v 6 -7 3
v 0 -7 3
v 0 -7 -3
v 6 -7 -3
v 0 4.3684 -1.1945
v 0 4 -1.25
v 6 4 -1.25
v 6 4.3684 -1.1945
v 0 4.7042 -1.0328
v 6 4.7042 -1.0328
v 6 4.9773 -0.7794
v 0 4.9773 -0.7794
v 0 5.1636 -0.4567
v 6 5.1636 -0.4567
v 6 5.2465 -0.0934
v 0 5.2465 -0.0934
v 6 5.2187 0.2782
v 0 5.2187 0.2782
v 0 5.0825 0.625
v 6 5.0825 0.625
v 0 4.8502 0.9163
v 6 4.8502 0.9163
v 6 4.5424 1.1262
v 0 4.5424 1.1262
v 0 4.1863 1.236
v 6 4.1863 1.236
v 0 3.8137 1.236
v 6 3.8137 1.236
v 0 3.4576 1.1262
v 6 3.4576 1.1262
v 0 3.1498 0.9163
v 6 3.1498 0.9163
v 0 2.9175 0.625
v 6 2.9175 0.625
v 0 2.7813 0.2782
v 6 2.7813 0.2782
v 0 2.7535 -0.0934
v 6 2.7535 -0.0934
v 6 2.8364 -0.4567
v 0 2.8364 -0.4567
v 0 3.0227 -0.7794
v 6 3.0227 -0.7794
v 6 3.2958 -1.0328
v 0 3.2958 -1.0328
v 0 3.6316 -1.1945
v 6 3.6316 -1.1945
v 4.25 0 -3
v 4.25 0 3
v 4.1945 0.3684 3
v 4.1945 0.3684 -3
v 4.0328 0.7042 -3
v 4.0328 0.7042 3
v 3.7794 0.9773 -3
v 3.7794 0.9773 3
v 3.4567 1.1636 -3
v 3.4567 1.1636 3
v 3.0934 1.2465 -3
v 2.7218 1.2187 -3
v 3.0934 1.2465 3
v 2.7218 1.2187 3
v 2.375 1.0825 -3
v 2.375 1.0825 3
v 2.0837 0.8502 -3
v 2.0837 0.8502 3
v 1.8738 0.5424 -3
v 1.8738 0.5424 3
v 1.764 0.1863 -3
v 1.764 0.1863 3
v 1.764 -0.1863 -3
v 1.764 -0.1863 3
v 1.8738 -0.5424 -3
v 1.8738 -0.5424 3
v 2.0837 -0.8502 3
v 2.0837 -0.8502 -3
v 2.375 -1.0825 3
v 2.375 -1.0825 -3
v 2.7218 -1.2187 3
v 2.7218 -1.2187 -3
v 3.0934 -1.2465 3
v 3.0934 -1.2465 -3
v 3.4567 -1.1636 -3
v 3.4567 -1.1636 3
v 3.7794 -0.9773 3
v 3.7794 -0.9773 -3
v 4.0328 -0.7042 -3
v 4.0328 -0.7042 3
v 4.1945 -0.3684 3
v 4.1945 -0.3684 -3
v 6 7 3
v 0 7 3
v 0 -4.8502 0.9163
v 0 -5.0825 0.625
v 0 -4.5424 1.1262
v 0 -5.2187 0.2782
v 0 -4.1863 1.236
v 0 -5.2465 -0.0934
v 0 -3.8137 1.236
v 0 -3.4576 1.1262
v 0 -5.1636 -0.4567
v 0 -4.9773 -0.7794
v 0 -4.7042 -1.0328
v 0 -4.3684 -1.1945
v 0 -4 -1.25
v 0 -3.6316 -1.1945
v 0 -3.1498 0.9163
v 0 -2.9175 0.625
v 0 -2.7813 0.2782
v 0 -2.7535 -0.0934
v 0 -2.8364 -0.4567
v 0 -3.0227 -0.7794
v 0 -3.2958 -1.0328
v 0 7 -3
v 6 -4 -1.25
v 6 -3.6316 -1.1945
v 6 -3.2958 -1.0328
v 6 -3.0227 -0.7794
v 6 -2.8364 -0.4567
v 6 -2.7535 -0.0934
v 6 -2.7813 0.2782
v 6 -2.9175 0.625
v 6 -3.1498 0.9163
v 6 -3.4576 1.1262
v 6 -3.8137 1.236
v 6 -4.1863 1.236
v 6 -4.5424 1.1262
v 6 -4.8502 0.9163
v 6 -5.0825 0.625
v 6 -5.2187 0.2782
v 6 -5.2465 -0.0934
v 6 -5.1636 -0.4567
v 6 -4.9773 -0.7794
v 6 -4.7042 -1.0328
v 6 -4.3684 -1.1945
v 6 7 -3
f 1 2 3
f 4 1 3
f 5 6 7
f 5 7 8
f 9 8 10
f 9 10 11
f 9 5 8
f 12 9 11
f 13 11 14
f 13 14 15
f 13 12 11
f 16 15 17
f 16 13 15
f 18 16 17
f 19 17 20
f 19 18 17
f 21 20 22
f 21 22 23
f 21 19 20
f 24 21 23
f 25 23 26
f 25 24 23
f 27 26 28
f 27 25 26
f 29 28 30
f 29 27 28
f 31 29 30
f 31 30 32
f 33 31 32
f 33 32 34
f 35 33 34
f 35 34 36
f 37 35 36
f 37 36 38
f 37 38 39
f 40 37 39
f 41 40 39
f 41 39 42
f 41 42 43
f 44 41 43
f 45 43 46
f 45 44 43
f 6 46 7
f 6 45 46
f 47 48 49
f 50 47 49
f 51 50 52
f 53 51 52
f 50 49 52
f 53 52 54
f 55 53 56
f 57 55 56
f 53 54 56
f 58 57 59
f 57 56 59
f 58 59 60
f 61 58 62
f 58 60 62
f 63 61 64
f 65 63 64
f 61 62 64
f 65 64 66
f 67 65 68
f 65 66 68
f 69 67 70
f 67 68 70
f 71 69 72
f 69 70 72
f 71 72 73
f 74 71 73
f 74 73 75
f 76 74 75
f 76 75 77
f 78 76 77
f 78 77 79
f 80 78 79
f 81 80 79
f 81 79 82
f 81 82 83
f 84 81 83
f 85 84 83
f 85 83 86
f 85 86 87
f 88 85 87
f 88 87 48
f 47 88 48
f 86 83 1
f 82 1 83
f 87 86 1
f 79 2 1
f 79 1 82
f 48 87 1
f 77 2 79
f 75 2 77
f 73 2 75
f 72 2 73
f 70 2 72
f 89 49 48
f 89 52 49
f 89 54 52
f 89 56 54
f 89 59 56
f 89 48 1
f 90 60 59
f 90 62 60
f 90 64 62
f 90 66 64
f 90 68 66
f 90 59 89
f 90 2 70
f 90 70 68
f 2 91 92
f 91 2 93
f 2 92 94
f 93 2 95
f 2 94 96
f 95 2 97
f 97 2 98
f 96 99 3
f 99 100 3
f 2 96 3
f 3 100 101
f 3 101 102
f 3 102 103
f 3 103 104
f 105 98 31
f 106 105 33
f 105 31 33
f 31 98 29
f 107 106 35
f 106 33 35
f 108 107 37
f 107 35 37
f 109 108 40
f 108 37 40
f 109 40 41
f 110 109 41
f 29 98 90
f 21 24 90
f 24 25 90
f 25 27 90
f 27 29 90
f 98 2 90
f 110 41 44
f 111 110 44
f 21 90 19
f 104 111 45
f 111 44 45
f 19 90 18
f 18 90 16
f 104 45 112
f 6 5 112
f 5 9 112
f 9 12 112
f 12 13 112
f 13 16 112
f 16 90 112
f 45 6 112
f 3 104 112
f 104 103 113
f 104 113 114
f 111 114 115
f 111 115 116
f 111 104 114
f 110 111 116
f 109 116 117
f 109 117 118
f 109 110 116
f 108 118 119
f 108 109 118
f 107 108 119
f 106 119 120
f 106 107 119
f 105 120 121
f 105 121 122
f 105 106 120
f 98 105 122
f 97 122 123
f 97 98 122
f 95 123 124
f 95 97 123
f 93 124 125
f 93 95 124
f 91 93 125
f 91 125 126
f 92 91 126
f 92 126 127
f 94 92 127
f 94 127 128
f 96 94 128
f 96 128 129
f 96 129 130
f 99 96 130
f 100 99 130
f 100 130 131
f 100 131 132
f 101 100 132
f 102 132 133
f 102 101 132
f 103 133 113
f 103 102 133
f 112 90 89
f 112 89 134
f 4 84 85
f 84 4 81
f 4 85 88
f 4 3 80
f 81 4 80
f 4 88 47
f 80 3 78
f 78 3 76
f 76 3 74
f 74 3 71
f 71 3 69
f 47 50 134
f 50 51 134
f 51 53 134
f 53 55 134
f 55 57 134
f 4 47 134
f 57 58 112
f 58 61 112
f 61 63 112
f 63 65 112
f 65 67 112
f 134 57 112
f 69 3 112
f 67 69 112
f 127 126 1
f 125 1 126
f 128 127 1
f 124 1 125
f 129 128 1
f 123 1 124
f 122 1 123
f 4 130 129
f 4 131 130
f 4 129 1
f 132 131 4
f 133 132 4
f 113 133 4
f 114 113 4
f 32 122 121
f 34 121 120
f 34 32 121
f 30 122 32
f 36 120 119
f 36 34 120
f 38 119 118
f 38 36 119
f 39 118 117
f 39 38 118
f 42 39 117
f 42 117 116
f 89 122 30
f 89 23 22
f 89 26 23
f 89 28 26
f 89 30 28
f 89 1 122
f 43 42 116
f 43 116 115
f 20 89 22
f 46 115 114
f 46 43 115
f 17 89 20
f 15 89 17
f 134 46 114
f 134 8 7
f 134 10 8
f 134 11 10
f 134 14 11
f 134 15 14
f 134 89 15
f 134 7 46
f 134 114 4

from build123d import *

# Parameters (mm, degrees)
SKETCH_1_W          = 6
SKETCH_1_H          = 14
SKETCH_1_R          = 1.25
EXTRUDE_1_DEPTH     = 6
SKETCH_2_R          = 1.25
CUT_EXTRUDE_1_DEPTH = 7


with BuildPart() as part:
    # 草图1 → 凸台-拉伸1 (new body)
    with BuildSketch(Plane(origin=(0, 0, 0), x_dir=(0, 0, -1), z_dir=(1, 0, 0))):
        Rectangle(SKETCH_1_W, SKETCH_1_H)
        with Locations((0, 4)):
            Circle(SKETCH_1_R, mode=Mode.SUBTRACT)
        with Locations((0, -4)):
            Circle(SKETCH_1_R, mode=Mode.SUBTRACT)
    extrude(amount=EXTRUDE_1_DEPTH)

    # 草图2 → 切除-拉伸1 (cut, through all)
    with BuildSketch(Plane.XY.offset(3)):
        with Locations((3, 0)):
            Circle(SKETCH_2_R)
    extrude(amount=-CUT_EXTRUDE_1_DEPTH, mode=Mode.SUBTRACT)


solid = part.part
